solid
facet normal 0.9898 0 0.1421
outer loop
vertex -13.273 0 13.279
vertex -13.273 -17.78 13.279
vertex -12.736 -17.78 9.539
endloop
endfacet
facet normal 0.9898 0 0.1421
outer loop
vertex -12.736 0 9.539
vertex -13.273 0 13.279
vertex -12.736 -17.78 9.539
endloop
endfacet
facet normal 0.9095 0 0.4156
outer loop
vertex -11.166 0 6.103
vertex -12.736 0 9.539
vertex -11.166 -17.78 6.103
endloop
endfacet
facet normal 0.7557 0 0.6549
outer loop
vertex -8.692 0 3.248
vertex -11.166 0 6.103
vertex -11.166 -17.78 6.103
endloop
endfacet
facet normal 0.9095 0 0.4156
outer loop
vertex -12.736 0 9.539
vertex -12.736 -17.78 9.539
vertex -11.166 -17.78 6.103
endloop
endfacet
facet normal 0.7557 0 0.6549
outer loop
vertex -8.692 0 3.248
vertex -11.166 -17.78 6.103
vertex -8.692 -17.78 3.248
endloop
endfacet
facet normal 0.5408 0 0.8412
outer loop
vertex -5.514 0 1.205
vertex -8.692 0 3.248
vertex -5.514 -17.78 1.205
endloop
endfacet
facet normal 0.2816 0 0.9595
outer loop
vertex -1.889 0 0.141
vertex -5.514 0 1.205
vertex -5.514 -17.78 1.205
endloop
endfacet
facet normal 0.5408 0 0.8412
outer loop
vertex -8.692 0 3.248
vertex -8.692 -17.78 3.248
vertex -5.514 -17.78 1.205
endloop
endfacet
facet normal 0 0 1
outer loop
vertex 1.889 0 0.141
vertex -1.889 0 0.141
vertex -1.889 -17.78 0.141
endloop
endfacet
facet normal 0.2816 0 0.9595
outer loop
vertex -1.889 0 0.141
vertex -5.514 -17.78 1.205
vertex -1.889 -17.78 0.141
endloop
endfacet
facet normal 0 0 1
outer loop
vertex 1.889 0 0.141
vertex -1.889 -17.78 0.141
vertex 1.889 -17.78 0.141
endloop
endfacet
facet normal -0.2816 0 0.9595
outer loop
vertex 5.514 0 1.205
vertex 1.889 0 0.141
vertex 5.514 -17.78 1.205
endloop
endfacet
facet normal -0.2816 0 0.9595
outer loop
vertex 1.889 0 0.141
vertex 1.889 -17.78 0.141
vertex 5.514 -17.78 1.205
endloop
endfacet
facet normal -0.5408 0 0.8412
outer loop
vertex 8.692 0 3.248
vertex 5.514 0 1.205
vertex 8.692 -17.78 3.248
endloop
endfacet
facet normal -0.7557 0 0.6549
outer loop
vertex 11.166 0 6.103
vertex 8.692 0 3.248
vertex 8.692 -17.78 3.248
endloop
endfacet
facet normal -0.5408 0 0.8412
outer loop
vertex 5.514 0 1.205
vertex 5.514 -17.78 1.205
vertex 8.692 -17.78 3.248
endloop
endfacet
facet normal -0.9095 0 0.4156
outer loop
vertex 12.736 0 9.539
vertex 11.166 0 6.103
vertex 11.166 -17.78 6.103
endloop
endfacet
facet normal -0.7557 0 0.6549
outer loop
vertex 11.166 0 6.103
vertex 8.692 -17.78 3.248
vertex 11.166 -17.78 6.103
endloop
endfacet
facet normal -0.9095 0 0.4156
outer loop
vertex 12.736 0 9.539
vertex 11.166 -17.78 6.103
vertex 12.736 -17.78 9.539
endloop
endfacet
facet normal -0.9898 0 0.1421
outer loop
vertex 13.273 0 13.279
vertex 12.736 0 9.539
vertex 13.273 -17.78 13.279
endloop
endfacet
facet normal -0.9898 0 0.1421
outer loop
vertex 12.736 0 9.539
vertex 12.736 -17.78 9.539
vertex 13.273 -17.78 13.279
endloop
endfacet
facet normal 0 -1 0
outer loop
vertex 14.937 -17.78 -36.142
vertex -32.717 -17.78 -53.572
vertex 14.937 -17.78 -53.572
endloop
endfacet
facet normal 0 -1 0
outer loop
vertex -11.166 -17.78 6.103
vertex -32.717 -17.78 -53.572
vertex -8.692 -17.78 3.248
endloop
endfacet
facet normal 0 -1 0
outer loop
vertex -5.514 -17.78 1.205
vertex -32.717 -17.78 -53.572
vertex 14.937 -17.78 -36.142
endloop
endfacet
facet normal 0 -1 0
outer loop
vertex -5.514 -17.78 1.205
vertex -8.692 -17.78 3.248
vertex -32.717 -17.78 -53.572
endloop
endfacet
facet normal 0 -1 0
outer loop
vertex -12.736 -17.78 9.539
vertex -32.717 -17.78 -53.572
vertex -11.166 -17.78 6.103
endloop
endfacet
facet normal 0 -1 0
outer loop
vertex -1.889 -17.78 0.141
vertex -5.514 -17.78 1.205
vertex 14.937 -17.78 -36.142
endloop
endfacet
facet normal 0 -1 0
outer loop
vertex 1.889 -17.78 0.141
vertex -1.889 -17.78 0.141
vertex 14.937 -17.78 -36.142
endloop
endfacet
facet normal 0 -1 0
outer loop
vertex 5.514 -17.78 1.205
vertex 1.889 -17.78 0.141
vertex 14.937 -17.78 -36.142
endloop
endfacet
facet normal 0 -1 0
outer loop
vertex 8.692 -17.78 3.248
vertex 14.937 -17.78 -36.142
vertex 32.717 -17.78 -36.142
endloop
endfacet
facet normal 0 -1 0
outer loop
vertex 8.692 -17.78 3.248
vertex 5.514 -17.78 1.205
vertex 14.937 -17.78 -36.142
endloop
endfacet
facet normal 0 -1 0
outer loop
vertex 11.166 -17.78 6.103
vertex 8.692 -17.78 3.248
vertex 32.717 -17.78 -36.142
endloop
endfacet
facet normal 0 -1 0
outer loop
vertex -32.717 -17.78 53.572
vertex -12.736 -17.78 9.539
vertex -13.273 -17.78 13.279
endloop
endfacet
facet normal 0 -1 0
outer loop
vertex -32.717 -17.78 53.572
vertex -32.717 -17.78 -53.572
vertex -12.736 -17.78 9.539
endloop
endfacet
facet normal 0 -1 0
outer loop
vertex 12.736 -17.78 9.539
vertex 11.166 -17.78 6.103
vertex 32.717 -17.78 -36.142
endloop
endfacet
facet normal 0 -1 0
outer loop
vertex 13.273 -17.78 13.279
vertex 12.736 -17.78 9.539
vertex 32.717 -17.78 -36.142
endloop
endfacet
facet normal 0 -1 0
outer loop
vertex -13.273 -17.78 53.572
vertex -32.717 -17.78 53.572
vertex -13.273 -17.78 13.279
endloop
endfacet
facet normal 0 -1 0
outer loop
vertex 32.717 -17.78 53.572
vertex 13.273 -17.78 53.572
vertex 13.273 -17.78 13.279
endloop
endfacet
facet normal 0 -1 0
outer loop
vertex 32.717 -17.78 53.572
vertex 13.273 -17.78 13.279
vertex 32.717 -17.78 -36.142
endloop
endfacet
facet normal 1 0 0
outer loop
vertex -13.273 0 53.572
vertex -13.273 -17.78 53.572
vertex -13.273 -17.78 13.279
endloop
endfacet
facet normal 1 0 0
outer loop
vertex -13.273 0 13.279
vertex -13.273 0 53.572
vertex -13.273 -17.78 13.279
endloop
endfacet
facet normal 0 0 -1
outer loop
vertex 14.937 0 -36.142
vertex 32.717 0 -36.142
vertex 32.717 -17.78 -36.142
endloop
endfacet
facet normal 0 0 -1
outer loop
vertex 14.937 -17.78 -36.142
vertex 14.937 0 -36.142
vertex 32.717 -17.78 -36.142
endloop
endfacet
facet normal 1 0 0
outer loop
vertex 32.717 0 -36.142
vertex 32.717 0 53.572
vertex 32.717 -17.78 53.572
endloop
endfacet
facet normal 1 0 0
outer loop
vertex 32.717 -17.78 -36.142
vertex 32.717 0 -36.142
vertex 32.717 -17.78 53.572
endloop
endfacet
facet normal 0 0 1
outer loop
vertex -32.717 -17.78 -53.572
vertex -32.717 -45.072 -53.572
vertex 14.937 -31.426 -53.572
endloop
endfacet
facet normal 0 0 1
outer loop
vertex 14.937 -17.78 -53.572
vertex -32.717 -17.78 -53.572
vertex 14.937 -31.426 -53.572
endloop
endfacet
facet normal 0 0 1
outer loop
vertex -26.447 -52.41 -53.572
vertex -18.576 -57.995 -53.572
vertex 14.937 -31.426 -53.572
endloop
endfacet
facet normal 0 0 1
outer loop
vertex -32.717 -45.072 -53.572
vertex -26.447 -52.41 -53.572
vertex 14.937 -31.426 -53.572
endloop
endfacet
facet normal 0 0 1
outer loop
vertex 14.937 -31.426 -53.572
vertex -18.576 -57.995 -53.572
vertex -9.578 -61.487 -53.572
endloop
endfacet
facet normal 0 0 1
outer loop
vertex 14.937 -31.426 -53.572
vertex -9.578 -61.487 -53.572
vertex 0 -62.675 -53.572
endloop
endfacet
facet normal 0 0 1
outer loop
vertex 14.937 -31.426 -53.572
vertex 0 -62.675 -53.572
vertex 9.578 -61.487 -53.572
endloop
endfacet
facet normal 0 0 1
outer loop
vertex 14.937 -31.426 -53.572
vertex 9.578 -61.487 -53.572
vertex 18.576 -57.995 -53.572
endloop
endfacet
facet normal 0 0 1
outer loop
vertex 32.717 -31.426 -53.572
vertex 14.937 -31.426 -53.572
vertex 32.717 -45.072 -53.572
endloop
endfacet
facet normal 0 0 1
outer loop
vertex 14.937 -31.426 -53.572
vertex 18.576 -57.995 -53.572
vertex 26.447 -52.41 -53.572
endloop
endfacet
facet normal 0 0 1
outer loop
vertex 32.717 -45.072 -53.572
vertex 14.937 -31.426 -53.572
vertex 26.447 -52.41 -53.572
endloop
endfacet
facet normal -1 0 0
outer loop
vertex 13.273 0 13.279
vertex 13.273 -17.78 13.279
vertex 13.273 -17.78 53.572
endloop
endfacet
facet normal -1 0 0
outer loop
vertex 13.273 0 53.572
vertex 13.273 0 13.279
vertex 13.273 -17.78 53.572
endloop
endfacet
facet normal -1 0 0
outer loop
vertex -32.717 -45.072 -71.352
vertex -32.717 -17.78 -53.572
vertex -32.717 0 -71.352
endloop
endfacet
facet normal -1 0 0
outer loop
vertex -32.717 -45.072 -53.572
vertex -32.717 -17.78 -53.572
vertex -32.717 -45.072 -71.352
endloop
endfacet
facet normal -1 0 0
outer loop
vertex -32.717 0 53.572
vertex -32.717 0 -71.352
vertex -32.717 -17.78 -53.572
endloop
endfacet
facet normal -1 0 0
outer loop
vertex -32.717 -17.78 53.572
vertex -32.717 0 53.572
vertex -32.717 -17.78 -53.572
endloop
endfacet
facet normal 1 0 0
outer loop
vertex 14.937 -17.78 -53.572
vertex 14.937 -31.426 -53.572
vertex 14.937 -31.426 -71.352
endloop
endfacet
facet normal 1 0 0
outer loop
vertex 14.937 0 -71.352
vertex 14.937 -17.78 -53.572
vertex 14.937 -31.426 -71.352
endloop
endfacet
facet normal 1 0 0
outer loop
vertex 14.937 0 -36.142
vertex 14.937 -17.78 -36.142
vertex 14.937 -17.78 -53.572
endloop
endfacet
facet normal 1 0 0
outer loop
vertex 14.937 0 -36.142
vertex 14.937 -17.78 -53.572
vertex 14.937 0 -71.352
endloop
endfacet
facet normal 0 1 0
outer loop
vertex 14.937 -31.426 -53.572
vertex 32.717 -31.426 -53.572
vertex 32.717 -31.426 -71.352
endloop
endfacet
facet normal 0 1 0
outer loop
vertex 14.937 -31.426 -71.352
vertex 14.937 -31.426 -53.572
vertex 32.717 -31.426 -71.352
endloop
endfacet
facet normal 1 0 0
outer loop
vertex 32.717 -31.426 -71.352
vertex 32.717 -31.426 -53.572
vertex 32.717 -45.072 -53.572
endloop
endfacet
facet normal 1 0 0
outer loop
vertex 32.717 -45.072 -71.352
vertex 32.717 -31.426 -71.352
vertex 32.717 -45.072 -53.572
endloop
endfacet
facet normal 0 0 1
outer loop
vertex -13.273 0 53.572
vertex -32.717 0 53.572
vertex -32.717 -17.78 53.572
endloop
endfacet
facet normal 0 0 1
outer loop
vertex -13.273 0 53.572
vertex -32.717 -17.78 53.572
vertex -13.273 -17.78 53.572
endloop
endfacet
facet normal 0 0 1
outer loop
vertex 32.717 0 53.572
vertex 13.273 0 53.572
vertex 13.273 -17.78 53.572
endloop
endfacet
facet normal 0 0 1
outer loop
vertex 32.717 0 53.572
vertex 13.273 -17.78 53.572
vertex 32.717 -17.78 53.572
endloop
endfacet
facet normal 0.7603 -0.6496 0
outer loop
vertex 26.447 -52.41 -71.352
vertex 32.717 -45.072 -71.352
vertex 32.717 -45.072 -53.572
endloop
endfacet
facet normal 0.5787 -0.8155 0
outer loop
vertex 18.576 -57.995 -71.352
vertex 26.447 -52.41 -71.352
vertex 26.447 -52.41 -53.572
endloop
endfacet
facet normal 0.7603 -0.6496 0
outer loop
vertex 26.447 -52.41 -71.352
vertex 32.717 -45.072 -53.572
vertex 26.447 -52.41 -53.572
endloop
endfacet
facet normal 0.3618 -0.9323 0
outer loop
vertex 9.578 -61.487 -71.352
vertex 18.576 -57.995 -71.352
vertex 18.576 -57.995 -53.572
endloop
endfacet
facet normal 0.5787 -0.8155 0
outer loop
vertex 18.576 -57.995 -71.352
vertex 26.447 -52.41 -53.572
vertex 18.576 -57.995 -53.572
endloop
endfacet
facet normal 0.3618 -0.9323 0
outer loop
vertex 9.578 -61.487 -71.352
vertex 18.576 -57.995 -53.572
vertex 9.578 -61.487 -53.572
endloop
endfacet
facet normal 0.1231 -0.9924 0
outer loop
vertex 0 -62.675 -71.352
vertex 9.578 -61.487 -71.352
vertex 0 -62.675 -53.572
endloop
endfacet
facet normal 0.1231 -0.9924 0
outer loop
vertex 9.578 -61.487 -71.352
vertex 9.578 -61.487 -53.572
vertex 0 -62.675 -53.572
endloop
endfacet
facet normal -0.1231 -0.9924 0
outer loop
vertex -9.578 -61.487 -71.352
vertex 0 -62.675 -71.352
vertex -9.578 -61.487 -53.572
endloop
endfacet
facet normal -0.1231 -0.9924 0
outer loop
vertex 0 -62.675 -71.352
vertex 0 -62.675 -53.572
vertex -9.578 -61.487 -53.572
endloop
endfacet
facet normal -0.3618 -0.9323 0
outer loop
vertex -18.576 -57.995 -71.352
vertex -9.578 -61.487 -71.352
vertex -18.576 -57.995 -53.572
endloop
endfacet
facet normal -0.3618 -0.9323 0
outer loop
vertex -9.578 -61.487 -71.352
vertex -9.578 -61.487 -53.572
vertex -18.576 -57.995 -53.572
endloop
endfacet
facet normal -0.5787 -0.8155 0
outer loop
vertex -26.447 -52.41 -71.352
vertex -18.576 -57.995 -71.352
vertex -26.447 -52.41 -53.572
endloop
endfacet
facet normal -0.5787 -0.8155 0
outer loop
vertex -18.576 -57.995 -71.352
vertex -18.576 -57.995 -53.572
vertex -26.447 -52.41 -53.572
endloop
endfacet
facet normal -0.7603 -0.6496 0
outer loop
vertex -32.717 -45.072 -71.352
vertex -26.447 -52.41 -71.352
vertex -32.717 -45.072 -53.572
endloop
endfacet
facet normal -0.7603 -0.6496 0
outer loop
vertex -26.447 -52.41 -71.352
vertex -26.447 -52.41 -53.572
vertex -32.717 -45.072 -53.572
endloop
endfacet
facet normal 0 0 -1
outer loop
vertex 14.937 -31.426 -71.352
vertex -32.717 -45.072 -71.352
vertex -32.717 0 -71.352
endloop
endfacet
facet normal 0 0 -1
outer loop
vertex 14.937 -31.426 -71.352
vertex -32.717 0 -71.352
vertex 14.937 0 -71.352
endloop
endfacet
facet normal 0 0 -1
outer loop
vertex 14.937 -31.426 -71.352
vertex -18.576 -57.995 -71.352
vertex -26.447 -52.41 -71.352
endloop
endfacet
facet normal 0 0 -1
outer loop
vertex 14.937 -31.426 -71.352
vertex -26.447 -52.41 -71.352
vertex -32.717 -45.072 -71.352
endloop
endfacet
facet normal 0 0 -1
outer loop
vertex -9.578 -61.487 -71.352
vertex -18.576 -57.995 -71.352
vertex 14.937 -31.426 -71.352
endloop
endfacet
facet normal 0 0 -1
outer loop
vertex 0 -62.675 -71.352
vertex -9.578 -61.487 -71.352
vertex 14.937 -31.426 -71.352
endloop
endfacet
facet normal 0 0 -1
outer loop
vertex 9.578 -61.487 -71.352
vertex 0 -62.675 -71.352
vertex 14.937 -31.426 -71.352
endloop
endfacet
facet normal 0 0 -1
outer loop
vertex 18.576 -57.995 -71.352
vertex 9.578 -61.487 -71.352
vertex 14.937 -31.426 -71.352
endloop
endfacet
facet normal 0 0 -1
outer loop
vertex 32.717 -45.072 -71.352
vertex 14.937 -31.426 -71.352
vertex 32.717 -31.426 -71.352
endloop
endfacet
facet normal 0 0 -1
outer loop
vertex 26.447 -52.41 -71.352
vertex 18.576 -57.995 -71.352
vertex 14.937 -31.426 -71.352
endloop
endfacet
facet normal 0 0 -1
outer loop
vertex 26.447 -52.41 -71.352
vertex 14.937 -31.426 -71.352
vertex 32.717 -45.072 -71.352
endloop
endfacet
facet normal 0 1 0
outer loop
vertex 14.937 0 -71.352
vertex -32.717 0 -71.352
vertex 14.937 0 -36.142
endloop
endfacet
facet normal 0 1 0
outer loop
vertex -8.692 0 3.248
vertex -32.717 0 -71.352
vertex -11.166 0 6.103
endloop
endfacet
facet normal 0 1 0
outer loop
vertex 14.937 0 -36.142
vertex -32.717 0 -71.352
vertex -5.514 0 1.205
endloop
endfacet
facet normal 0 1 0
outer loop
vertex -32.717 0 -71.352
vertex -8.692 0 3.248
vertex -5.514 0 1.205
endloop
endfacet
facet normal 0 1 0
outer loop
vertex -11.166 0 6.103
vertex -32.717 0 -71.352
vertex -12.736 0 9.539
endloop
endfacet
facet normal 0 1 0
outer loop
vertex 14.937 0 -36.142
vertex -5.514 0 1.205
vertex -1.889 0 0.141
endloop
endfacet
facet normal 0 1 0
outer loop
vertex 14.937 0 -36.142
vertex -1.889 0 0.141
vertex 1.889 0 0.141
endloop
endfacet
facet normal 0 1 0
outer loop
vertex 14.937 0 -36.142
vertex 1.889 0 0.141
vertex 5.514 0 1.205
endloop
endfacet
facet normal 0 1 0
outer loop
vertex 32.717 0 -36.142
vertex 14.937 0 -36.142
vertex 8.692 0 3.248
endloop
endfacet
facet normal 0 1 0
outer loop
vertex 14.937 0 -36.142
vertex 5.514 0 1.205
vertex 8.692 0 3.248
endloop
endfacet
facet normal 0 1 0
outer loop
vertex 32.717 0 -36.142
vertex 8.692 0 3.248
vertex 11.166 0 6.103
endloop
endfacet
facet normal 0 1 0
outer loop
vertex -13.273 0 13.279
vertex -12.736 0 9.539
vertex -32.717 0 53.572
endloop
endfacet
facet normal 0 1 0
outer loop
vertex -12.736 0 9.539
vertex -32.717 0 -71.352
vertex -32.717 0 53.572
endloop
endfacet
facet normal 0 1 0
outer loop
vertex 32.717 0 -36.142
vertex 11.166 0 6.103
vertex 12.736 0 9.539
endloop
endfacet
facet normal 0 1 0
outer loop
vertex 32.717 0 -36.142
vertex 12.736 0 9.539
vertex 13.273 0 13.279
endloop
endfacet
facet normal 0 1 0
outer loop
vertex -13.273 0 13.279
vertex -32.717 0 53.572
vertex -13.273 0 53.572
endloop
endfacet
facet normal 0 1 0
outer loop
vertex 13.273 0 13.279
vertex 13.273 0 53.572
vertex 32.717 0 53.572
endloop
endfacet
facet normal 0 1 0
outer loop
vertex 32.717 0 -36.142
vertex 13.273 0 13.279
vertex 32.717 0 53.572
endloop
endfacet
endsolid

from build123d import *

# Parameters (mm, degrees)
F0_W     = 65.433032
F0_H     = 107.144848
F1_DEPTH = 17.78
F2_W     = 65.433032
F2_H     = 45.072302
F3_DEPTH = 17.78
F5_DEPTH = 17.78
F7_DEPTH = 25.4


with BuildPart() as f1:
    # F0 (on Front) → F1 (new body)
    with BuildSketch(Plane.XZ):
        Rectangle(F0_W, F0_H)
    extrude(amount=F1_DEPTH)

    # F2 (on face) → F3 (join)
    with BuildSketch(Plane(origin=(0, 0, -53.572424), x_dir=(1, 0, 0), z_dir=(0, 0, -1))):
        with Locations((0, 22.536151)):
            Rectangle(F2_W, F2_H)
        with BuildLine():
            ThreePointArc((32.716516, 45.072302), (0, 62.674601), (-32.716516, 45.072302))
            Line((-32.716516, 45.072302), (32.716516, 45.072302))
        make_face()
    extrude(amount=F3_DEPTH)

    # F4 (on face) → F5 (cut)
    with BuildSketch(Plane.YZ.offset(32.716516)):
        Polygon((0, -71.352424), (0, -36.141511), (-17.78, -36.141511), (-17.78, -53.572424), (-31.426151, -53.572424), (-31.426151, -71.352424), align=None)
    extrude(amount=-F5_DEPTH, mode=Mode.SUBTRACT)

    # F6 (on face) → F7 (cut)
    with BuildSketch(Plane.XZ.offset(17.78)):
        with BuildLine():
            Line((13.273248, 13.279006), (13.273248, 93.865842))
            Line((13.273248, 93.865842), (-13.273248, 93.865842))
            Line((-13.273248, 93.865842), (-13.273248, 13.279006))
            ThreePointArc((-13.273248, 13.279006), (0, 0.005758), (13.273248, 13.279006))
        make_face()
    extrude(amount=-F7_DEPTH, mode=Mode.SUBTRACT)


solid = f1.part
